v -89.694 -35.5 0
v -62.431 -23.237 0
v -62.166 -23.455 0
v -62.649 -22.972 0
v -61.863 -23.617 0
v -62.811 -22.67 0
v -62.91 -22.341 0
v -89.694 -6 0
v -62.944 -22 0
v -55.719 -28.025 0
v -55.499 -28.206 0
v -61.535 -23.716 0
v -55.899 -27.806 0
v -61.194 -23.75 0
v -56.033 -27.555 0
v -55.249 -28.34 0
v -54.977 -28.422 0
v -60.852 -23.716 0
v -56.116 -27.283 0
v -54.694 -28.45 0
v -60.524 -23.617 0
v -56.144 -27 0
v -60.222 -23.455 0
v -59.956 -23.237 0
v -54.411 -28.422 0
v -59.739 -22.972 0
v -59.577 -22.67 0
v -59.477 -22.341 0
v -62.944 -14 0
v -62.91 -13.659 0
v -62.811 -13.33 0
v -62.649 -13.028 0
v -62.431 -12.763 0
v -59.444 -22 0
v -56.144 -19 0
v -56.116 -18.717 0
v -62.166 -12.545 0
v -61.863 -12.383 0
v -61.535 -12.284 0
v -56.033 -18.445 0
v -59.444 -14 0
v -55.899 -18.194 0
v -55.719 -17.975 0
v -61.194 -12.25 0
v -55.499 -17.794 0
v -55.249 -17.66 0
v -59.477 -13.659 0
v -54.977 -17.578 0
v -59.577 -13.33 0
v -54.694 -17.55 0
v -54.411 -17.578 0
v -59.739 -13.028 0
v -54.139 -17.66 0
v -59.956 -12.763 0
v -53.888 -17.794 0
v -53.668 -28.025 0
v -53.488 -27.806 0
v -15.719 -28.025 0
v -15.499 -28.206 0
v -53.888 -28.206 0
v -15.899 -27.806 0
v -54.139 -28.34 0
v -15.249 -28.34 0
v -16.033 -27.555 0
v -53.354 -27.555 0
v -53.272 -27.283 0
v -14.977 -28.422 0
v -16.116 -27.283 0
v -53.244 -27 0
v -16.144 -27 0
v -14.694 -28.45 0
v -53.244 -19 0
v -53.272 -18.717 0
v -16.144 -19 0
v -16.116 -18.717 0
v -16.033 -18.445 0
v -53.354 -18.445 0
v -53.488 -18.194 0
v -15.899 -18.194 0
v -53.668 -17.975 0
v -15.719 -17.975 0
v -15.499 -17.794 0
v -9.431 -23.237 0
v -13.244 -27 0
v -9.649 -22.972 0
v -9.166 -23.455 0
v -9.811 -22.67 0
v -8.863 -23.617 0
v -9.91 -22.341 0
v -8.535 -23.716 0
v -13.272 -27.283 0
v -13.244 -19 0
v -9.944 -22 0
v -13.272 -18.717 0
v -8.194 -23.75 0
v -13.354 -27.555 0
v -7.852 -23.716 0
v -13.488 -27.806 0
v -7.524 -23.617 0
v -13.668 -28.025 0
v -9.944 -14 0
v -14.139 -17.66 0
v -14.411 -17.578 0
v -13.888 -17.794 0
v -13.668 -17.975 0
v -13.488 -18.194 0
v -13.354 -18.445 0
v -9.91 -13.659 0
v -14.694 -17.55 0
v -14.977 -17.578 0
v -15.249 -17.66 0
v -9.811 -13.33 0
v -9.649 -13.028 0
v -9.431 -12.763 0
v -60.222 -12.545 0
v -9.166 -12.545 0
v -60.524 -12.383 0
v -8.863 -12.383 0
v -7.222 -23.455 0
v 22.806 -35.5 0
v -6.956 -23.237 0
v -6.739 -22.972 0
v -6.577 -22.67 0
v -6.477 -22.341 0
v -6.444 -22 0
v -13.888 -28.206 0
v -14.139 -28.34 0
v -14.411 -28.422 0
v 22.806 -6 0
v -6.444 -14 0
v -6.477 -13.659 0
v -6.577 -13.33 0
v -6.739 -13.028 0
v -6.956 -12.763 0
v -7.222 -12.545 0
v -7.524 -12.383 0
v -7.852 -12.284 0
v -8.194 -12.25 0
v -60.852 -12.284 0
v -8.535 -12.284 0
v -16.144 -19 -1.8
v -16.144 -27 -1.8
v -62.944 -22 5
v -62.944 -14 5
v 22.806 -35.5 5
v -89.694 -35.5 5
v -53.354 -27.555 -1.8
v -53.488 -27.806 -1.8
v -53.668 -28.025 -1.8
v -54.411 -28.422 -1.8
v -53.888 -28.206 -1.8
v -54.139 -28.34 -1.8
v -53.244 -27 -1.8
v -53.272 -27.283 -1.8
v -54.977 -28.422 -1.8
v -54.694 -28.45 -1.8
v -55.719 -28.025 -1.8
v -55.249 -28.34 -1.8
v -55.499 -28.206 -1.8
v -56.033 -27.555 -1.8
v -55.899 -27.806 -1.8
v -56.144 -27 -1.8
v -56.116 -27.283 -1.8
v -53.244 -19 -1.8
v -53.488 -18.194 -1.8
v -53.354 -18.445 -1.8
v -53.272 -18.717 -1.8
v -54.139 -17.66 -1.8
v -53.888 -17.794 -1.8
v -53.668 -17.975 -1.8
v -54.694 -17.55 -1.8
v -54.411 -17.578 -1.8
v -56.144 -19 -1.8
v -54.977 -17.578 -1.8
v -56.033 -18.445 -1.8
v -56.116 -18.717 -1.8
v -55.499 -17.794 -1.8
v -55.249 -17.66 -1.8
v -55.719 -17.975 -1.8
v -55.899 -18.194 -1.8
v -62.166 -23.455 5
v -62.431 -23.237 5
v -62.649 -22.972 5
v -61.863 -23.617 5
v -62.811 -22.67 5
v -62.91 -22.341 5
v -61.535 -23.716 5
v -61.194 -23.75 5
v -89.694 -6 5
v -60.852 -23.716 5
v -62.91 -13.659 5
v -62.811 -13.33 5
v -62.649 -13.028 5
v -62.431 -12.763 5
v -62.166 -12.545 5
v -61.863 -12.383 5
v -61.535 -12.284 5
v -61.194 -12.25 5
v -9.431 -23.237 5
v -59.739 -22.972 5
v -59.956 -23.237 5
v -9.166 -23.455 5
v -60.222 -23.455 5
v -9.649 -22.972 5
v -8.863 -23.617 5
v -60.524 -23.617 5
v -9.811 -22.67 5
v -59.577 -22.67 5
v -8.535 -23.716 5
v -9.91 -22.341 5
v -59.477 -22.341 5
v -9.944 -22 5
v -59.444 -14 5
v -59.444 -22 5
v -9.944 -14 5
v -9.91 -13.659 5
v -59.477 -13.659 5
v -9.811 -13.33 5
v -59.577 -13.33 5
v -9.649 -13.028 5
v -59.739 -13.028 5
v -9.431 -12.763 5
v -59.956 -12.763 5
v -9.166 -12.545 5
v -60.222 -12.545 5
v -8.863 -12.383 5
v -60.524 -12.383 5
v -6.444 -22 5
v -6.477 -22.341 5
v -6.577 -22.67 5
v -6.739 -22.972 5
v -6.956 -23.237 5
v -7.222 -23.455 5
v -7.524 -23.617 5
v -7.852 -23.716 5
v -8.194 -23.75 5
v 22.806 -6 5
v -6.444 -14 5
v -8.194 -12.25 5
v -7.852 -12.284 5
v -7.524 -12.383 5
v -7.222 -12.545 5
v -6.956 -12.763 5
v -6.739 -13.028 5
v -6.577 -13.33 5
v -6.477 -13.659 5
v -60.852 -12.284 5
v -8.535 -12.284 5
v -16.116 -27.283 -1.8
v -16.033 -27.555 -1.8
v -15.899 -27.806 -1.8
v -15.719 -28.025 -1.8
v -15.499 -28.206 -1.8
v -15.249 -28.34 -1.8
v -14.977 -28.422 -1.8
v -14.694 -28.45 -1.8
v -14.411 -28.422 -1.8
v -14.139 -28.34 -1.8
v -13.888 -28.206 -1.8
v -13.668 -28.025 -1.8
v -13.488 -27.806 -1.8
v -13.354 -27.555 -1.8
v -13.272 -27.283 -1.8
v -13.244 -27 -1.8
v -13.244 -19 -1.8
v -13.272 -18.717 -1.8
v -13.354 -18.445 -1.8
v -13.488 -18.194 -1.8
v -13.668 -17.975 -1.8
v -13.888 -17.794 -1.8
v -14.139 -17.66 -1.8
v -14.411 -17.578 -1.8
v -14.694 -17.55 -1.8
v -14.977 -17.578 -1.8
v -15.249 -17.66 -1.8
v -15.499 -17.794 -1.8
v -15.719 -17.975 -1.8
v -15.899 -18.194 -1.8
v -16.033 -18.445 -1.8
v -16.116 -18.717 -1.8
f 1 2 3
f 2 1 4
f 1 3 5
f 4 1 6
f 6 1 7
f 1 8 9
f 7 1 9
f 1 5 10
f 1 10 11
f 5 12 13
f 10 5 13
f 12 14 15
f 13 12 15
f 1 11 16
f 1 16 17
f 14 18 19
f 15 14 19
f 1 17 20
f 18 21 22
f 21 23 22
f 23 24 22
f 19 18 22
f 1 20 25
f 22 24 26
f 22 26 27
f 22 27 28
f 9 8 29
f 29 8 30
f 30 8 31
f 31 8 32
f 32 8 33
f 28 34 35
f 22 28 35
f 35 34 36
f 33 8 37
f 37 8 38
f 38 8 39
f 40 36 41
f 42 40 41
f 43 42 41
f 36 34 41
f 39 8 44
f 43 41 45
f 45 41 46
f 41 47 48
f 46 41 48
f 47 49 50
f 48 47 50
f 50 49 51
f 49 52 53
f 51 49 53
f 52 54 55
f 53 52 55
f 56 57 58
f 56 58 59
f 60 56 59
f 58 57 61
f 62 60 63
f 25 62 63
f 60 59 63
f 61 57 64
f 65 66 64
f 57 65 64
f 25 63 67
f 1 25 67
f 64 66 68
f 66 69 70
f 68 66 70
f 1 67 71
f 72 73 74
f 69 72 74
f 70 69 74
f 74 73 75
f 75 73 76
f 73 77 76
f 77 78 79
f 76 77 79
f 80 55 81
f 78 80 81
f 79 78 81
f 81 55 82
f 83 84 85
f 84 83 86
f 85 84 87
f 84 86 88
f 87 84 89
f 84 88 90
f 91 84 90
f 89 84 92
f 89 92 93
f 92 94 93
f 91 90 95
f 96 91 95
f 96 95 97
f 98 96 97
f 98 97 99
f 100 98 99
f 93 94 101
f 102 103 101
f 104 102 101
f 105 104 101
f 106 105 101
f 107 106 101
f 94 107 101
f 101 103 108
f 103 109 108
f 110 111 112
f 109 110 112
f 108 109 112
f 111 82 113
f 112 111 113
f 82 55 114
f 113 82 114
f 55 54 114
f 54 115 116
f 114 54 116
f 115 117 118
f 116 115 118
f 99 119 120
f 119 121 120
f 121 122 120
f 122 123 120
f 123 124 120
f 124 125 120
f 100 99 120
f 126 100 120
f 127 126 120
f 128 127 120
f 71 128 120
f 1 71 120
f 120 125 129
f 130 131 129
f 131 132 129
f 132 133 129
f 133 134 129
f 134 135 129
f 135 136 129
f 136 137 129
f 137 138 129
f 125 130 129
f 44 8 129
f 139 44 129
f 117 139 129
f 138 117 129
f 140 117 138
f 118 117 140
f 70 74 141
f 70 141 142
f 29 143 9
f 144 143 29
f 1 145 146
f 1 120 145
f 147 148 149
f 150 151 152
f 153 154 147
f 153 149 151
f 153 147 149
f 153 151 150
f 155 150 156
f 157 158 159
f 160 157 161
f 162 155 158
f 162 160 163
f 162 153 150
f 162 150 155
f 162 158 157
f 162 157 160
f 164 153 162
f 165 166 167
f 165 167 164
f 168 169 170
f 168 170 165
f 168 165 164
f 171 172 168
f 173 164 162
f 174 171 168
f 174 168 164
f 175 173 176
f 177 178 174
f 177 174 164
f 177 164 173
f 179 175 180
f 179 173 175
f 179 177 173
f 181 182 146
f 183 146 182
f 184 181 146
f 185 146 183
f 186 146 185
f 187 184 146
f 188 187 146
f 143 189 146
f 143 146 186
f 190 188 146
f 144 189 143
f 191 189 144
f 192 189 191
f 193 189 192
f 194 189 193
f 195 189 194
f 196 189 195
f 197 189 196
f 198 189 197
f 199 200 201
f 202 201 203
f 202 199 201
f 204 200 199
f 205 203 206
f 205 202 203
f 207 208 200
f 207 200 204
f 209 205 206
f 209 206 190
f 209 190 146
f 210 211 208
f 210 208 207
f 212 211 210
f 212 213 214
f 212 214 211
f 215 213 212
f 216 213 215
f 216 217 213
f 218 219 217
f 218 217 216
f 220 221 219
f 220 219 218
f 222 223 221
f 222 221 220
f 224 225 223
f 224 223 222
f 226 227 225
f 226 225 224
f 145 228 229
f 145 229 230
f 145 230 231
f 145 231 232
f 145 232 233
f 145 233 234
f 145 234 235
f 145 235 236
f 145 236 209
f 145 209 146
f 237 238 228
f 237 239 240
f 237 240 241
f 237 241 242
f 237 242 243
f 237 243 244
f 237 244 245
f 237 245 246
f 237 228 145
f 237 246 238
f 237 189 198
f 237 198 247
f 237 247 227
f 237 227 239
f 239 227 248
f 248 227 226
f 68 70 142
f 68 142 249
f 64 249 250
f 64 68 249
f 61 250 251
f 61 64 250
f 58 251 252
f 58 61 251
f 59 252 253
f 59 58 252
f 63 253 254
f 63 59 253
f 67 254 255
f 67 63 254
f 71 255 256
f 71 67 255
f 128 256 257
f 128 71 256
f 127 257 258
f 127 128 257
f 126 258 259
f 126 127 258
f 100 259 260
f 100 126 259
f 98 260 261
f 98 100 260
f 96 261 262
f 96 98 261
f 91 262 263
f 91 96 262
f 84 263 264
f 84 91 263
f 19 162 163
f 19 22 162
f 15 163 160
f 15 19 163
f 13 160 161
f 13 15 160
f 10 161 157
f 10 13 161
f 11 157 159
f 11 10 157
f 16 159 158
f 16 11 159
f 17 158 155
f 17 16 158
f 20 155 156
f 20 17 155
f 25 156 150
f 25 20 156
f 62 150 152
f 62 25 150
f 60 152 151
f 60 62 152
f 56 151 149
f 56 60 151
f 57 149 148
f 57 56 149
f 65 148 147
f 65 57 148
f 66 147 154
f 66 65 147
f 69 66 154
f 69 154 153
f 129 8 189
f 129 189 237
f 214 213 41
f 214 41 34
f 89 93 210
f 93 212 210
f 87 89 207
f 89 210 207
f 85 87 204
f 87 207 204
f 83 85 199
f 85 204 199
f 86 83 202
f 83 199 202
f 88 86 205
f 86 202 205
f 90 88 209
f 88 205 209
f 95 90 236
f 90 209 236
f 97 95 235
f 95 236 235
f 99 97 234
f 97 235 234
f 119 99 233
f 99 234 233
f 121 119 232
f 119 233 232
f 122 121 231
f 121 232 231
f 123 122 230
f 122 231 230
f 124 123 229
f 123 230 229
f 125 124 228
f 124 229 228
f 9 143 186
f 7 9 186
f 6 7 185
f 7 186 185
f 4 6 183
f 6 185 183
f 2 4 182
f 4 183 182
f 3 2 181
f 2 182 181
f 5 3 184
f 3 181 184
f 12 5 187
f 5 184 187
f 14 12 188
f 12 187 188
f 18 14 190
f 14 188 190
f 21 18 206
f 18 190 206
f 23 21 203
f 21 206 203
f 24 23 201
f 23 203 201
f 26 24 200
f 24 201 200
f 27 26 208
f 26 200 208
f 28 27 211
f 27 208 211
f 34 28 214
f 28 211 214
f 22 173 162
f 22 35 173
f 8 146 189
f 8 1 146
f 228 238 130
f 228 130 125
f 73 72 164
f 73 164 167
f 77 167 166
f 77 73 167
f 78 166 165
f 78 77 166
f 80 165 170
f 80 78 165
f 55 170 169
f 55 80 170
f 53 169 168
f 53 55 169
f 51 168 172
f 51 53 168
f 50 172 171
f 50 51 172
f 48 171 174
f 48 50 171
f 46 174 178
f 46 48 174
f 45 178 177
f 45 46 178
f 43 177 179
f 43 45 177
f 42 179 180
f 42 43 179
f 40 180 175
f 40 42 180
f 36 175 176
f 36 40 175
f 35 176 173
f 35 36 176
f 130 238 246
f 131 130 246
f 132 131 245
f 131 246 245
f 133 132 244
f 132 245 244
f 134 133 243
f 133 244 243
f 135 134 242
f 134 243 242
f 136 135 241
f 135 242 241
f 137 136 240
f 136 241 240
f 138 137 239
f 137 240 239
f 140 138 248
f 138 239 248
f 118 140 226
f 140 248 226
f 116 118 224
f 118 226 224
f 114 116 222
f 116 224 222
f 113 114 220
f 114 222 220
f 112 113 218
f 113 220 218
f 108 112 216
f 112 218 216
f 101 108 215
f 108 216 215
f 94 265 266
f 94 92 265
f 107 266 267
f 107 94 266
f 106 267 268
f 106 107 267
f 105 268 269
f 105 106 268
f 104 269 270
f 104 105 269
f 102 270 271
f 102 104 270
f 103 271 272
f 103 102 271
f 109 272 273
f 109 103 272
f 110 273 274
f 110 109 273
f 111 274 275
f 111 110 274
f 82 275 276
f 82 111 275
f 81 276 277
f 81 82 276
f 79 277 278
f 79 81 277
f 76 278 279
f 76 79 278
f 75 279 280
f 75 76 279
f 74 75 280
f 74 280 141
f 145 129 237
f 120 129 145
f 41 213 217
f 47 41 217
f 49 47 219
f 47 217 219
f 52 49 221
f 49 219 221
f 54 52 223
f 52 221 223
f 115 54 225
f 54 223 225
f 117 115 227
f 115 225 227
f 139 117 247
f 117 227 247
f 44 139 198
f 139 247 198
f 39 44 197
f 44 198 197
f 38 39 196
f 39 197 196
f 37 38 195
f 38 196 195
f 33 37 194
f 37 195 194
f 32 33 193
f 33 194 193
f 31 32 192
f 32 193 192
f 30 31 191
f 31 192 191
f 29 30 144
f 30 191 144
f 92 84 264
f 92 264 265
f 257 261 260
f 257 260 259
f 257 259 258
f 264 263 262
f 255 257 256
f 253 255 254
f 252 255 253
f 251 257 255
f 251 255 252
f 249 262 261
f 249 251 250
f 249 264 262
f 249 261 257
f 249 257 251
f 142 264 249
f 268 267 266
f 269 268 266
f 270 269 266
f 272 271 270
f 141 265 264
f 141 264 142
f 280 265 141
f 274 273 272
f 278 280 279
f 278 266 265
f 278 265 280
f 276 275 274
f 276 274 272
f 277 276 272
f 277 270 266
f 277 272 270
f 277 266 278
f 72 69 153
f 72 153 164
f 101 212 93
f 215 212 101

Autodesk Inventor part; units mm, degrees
ref_plane "YZ Plane" through (0, 0, 0) normal (1, 0, 0) x (0, 1, 0)
ref_plane "XZ Plane" through (0, 0, 0) normal (0, 1, 0) x (-1, 0, 0)
ref_plane "Work Plane1" through (0, 0, 0) normal (0, 0, 1) x (1, 0, 0)
sketch "Sketch1" plane through (0, 0, 0) normal (0, 0, 1) x (1, 0, 0)
  line L0 (22.8064, -35.5) -> (-89.6938, -35.5)
  line L1 (-89.6938, -35.5) -> (-89.6938, -6)
  line L2 (22.8064, -6) -> (22.8064, -35.5)
  circle A0 centre (11.5562, -18) radius 2 construction
  line L3 (-53.1938, -16) -> (-53.1938, -30) construction
  arc A1 (-56.1938, -30) -> (-53.1938, -30) centre (-54.6938, -30) ccw construction
  line L4 (-56.1938, -30) -> (-56.1938, -16) construction
  arc A2 (-53.1938, -16) -> (-56.1938, -16) centre (-54.6938, -16) ccw construction
  line L5 (7.0562, -16) -> (7.0562, -30) construction
  arc A3 (4.0562, -30) -> (7.0562, -30) centre (5.5562, -30) ccw construction
  line L6 (4.0562, -30) -> (4.0562, -16) construction
  arc A4 (7.0562, -16) -> (4.0562, -16) centre (5.5562, -16) ccw construction
  line L7 (-13.1938, -16) -> (-13.1938, -30) construction
  arc A5 (-16.1938, -30) -> (-13.1938, -30) centre (-14.6938, -30) ccw construction
  line L8 (-16.1938, -30) -> (-16.1938, -16) construction
  arc A6 (-13.1938, -16) -> (-16.1938, -16) centre (-14.6938, -16) ccw construction
  arc A7 (19.0562, -16) -> (16.0562, -16) centre (17.5562, -16) ccw construction
  line L9 (19.0562, -16) -> (19.0562, -30) construction
  arc A8 (16.0562, -30) -> (19.0562, -30) centre (17.5562, -30) ccw construction
  line L10 (16.0562, -30) -> (16.0562, -16) construction
  line L11 (22.8064, -40) -> (22.8064, 45) construction
  line L12 (22.8064, 45) -> (-120, 45) construction
  line L13 (-120, 27.5563) -> (-120, 45) construction
  line L14 (-120, 27.5563) -> (-95.2035, 27.5563) construction
  arc A9 (-85.0841, 27.5563) -> (-95.2035, 27.5563) centre (-90.1438, 25.4) ccw construction
  line L15 (-85.0841, 27.5563) -> (17.8062, 27.5563) construction
  line L16 (17.8062, 27.5563) -> (17.8062, -11) construction
  line L17 (17.8062, -11) -> (-120, -11) construction
  line L18 (-120, -40) -> (-120, -11) construction
  line L19 (22.8064, -40) -> (-120, -40) construction
  circle A10 centre (-111.1938, -18) radius 2 construction
  circle A11 centre (-98.1938, -18) radius 2 construction
  circle A12 centre (-61.1938, -18) radius 2 construction
  circle A13 centre (-48.1938, -18) radius 2 construction
  circle A14 centre (-21.1938, -18) radius 2 construction
  circle A15 centre (-8.1938, -18) radius 2 construction
  circle A16 centre (-21.1938, 33.6563) radius 2 construction
  circle A17 centre (-8.1938, 33.6563) radius 2 construction
  circle A18 centre (-61.1938, 33.6563) radius 2 construction
  circle A19 centre (-48.1938, 33.6563) radius 2 construction
  circle A20 centre (-111.1938, 33.6563) radius 2 construction
  circle A21 centre (-98.1938, 33.6563) radius 2 construction
  circle A22 centre (-90.1438, -25.4) radius 5.5 construction
  line L20 (-84.6938, 26.6563) -> (-89.6938, 26.6563) construction
  line L21 (-89.6938, 26.6563) -> (-89.6938, -11) construction
  line L22 (-84.6938, -11) -> (-89.6938, -11) construction
  line L23 (-84.6938, 26.6563) -> (-84.6938, -11) construction
  line L24 (-84.6938, 26.6563) -> (-84.6938, -11) construction
  circle A23 centre (1.3062, 0) radius 6 construction
  circle A24 centre (-68.1938, 0) radius 6 construction
  line L25 (-148.5613, 0) -> (51.3677, 0) construction
  line L26 (-89.6938, -6) -> (22.8064, -6)
  line L27 (5.3062, -57) -> (5.3062, 62) construction
  line L28 (-34.6938, -57) -> (-34.6938, 62) construction
  line L29 (-84.6938, -57) -> (-84.6938, 62) construction
  point P0 (17.5562, -31.5)
  dimension "d0" = 0
  dimension "d1" = 0
  dimension "d2" = 4
extrude "Main Body" add sketch "Sketch1" along normal blind 5
sketch "Sketch2" plane through (0, 0, 0) normal (0, 0, -1) x (-1, 0, 0)
  line L0 (56.1938, -30) -> (56.1938, -16) construction
  arc A0 (53.1938, -30) -> (56.1938, -30) centre (54.6938, -30) ccw construction
  line L1 (53.1938, -16) -> (53.1938, -30) construction
  arc A1 (56.1938, -16) -> (53.1938, -16) centre (54.6938, -16) ccw construction
  arc A2 (13.1938, -30) -> (16.1938, -30) centre (14.6938, -30) ccw construction
  line L2 (13.1938, -16) -> (13.1938, -30) construction
  arc A3 (16.1938, -16) -> (13.1938, -16) centre (14.6938, -16) ccw construction
  line L3 (16.1938, -30) -> (16.1938, -16) construction
  line L4 (14.6938, -16) -> (14.6938, -30) construction
  line L5 (54.6938, -16) -> (54.6938, -30) construction
  line L6 (14.6938, -27) -> (14.6938, -19) construction
  line L7 (13.2438, -27) -> (13.2438, -19)
  line L8 (16.1438, -19) -> (16.1438, -27)
  arc A4 (13.2438, -27) -> (16.1438, -27) centre (14.6938, -27) ccw
  arc A5 (16.1438, -19) -> (13.2438, -19) centre (14.6938, -19) ccw
  line L9 (54.6938, -27) -> (54.6938, -19) construction
  line L10 (53.2438, -27) -> (53.2438, -19)
  line L11 (56.1438, -19) -> (56.1438, -27)
  arc A6 (53.2438, -27) -> (56.1438, -27) centre (54.6938, -27) ccw
  arc A7 (56.1438, -19) -> (53.2438, -19) centre (54.6938, -19) ccw
  line L12 (14.6938, -19) -> (54.6938, -19) construction
  arc A8 (-7.0562, -30) -> (-4.0562, -30) centre (-5.5562, -30) ccw construction
  line L13 (-4.0562, -30) -> (-4.0562, -16) construction
  arc A9 (-4.0562, -16) -> (-7.0562, -16) centre (-5.5562, -16) ccw construction
  line L14 (-7.0562, -16) -> (-7.0562, -30) construction
  point P0 (0, 0)
  point P1 (14.6938, -23)
  point P2 (54.6938, -23)
  dimension "d7" = 0.05
  dimension "d8" = 0.05
  dimension "d9" = 3
extrude "Alignment Tabs" add sketch "Sketch2" along normal blind 1.8
sketch "Sketch3" plane through (0, 0, 5) normal (0, 0, -1) x (-1, 0, 0)
  circle A0 centre (61.1938, -18) radius 2 construction
  circle A1 centre (8.1938, -18) radius 2 construction
  line L0 (61.1938, -14) -> (61.1938, -22) construction
  line L1 (59.4438, -14) -> (59.4438, -22)
  line L2 (62.9438, -22) -> (62.9438, -14)
  arc A2 (62.9438, -14) -> (59.4438, -14) centre (61.1938, -14) ccw
  arc A3 (59.4438, -22) -> (62.9438, -22) centre (61.1938, -22) ccw
  line L3 (8.1938, -14) -> (8.1938, -22) construction
  line L4 (6.4438, -14) -> (6.4438, -22)
  line L5 (9.9438, -22) -> (9.9438, -14)
  arc A4 (9.9438, -14) -> (6.4438, -14) centre (8.1938, -14) ccw
  arc A5 (6.4438, -22) -> (9.9438, -22) centre (8.1938, -22) ccw
  point P0 (0, 0)
  dimension "d12" = 3.5
  dimension "d13" = 3.5
  dimension "d14" = 8
  dimension "d15" = 8
extrude "Slots for Screws M3" cut sketch "Sketch3" along normal through all
equation "\"d8\" = d7"
equation "\"d13\" = d12"
equation "\"d15\" = d14"
properties part number "Cuvette Aligner 100mm Flat Edge"
